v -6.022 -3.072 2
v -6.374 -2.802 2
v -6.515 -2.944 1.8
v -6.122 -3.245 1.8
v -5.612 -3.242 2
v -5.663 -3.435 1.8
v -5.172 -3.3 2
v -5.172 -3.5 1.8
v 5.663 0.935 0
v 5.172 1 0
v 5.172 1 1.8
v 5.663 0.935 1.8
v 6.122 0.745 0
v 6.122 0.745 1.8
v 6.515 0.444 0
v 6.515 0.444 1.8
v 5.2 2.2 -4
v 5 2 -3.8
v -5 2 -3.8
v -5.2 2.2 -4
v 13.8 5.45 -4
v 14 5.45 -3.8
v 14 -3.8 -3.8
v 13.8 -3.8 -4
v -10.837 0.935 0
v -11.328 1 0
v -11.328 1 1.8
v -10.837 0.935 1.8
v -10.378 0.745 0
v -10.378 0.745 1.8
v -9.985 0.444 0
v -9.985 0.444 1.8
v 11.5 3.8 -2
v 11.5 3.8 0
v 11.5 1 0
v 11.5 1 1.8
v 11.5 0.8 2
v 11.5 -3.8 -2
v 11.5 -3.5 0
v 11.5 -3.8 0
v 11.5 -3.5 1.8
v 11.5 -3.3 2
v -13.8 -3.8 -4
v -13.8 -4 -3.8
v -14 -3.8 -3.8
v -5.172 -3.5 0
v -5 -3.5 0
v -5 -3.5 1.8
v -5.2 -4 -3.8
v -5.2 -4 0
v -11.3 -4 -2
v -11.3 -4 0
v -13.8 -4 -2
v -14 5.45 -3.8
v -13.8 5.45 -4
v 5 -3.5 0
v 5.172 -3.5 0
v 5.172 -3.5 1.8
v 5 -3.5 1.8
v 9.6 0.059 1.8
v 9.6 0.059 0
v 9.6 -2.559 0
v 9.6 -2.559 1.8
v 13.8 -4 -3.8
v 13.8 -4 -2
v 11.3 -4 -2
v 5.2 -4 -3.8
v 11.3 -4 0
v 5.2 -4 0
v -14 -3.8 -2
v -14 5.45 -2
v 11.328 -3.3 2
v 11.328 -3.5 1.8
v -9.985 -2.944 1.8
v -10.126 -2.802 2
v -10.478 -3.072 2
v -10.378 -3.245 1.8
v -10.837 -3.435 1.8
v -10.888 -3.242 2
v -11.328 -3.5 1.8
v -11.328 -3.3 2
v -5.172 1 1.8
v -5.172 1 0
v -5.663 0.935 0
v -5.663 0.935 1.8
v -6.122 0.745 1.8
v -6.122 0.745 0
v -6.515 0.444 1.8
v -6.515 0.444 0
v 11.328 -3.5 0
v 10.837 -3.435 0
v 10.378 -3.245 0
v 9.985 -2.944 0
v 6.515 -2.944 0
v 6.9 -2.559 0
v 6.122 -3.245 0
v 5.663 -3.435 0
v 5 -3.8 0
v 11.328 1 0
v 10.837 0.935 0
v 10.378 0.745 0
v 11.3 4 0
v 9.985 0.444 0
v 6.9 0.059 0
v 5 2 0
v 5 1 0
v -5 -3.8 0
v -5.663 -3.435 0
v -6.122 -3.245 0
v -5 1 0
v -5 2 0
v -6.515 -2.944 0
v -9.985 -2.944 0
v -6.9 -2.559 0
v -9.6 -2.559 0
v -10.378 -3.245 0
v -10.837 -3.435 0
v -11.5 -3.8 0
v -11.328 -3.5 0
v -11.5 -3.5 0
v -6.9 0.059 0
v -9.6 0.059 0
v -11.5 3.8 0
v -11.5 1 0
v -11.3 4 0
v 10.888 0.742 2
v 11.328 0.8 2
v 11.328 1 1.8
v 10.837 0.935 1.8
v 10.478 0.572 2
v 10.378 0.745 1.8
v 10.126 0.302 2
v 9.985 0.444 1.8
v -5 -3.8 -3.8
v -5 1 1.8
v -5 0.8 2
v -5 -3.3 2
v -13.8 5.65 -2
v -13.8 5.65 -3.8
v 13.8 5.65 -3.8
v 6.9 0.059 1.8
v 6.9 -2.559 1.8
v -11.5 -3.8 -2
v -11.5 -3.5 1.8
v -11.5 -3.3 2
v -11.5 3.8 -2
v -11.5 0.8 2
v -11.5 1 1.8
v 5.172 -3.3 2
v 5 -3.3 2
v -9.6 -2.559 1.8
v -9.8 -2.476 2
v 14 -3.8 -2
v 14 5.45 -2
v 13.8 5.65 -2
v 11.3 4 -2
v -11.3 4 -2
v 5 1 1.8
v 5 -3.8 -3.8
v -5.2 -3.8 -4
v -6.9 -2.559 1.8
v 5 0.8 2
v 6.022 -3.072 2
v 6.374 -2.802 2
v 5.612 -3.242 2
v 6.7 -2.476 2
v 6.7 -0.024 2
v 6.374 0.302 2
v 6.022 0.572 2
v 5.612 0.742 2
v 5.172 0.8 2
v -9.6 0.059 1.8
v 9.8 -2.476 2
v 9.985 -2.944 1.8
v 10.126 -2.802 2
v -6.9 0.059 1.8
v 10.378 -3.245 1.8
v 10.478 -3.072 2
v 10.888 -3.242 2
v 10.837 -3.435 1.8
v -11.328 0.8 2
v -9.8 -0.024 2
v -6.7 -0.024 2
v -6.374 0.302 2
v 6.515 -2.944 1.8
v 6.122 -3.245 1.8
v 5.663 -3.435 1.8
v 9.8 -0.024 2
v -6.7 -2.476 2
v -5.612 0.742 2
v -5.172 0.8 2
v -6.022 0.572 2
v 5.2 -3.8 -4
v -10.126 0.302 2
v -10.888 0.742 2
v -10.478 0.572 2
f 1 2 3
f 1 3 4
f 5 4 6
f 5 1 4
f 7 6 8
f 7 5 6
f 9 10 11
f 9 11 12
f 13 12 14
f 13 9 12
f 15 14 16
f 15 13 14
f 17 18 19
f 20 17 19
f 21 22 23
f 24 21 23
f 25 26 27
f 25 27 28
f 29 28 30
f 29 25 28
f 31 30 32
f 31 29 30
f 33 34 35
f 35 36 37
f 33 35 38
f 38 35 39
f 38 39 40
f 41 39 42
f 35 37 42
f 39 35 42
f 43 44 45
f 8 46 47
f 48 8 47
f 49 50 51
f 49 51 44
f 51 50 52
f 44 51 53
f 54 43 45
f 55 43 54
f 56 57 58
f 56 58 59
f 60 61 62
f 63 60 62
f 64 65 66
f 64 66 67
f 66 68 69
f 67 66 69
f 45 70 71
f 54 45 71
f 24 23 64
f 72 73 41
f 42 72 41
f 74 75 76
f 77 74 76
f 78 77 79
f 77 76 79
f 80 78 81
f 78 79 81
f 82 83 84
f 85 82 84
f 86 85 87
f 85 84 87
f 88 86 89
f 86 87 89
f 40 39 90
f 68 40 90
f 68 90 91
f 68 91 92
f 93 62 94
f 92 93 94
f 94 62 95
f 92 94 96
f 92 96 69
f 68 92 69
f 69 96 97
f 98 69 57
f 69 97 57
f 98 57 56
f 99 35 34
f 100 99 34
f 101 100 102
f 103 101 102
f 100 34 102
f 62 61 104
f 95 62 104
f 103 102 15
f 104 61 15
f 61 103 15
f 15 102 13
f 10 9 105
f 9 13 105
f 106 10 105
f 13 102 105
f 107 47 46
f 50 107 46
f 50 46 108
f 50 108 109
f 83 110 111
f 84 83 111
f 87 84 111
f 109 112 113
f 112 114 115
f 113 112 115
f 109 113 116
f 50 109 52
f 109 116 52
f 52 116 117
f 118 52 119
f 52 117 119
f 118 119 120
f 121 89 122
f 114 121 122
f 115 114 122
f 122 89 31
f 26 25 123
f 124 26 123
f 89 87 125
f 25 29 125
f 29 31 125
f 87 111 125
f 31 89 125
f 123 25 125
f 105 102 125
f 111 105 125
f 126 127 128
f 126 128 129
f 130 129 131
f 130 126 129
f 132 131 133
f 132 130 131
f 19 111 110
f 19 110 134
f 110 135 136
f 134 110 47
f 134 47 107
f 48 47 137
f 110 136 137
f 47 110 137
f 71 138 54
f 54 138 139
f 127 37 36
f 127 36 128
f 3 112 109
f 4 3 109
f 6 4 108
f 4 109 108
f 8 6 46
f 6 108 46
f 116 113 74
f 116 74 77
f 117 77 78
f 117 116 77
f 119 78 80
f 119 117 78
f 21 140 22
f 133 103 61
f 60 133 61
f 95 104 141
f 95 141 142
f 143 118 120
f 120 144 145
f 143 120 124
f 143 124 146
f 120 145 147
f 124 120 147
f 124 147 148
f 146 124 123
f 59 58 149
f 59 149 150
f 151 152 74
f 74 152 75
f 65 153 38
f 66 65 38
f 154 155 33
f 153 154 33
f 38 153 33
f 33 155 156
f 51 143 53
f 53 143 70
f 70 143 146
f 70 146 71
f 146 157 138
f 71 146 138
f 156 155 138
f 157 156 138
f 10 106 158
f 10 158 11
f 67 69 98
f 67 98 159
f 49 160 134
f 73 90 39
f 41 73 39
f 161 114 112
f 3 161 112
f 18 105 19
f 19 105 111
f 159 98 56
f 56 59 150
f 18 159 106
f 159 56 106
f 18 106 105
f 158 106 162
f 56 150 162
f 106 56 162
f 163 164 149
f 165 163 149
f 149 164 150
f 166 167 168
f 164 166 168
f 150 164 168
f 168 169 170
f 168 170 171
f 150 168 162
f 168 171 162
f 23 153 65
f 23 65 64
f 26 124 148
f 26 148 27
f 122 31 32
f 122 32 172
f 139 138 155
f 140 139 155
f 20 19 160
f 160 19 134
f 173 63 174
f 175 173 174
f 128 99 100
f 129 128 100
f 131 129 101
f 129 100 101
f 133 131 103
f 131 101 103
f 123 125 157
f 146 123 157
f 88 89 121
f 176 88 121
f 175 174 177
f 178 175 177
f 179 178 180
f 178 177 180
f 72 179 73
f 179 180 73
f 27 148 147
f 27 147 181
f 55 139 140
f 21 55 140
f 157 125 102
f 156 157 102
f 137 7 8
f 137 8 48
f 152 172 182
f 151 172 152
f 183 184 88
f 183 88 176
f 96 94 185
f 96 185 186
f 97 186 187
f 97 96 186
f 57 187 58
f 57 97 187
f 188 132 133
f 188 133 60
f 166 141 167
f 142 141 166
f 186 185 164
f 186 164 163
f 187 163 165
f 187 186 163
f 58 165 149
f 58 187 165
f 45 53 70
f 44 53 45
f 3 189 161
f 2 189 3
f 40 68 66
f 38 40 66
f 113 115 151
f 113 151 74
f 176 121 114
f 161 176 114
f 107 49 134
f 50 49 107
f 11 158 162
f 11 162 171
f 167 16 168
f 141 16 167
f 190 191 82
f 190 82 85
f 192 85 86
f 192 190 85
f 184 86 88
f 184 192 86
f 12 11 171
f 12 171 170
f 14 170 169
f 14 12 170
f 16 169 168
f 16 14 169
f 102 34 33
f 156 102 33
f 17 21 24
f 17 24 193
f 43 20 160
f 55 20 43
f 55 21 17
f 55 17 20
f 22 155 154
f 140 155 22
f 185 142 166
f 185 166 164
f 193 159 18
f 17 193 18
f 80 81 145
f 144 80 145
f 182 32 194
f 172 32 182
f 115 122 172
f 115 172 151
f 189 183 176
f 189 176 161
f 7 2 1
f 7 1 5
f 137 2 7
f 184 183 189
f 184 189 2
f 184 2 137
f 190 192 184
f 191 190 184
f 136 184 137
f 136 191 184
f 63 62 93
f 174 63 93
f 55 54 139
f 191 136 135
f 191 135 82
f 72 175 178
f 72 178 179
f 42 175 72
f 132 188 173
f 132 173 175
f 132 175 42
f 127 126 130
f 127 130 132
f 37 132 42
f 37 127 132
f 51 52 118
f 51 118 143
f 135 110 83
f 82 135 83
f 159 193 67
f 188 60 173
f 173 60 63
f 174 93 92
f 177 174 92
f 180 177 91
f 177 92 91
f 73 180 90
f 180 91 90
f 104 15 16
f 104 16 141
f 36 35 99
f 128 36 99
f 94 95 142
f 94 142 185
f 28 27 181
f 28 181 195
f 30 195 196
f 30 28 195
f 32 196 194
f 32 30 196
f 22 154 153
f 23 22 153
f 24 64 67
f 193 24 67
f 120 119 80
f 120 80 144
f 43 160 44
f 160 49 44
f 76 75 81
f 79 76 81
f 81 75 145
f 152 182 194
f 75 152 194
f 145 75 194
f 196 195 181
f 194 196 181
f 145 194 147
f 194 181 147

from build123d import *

# Parameters (mm, degrees)
BOSS_EXTRUDE1_DEPTH  = 2
BOSS_EXTRUDE2_DEPTH  = 2
MIRROR2_COPY_1_DEPTH = 2
STOPPER_DEPTH        = 2
STOPPER_DEBURS_SIZE  = 0.2


with BuildPart() as part:
    # Sketch1 → Boss-Extrude1 (new body)
    with BuildSketch(Plane.XY):
        Polygon((-11.5, 4), (11.5, 4), (11.5, -4), (5, -4), (5, 2), (-5, 2), (-5, -4), (-11.5, -4), align=None)
    extrude(amount=-BOSS_EXTRUDE1_DEPTH)

    # Sketch2 → Boss-Extrude2 (add)
    with BuildSketch(Plane.XY):
        with BuildLine():
            Line((11.5, -3.5), (11.5, 1))
            Line((11.5, 1), (11.328427125, 1))
            ThreePointArc((11.328427125, 1), (10.601328603, 0.855371112), (9.98492424, 0.443502884))
            Line((9.98492424, 0.443502884), (9.6, 0.058578644))
            Line((9.6, 0.058578644), (9.6, -2.558578644))
            Line((9.6, -2.558578644), (9.98492424, -2.943502884))
            ThreePointArc((9.98492424, -2.943502884), (10.601328603, -3.355371112), (11.328427125, -3.5))
            Line((11.328427125, -3.5), (11.5, -3.5))
        make_face()
    boss_extrude2 = extrude(amount=BOSS_EXTRUDE2_DEPTH)

    # Mirror1: Boss-Extrude2 across plane
    add(boss_extrude2.mirror(Plane(origin=(8.25, 0, 0), x_dir=(0, 0, 1), z_dir=(1, 0, 0))))

    # Mirror2: Boss-Extrude2 across plane
    add(boss_extrude2.mirror(Plane(origin=(0, 0, 0), x_dir=(0, 0, 1), z_dir=(1, 0, 0))))

    # Mirror2 copy 1 sketch → Mirror2 copy 1 (add)
    with BuildSketch(Plane(origin=(-16.5, 0, 0), x_dir=(1, 0, 0), z_dir=(0, 0, 1))):
        with BuildLine():
            Line((11.5, -3.5), (11.5, 1))
            Line((11.5, 1), (11.328427125, 1))
            ThreePointArc((11.328427125, 1), (10.601328603, 0.855371112), (9.98492424, 0.443502884))
            Line((9.98492424, 0.443502884), (9.6, 0.058578644))
            Line((9.6, 0.058578644), (9.6, -2.558578644))
            Line((9.6, -2.558578644), (9.98492424, -2.943502884))
            ThreePointArc((9.98492424, -2.943502884), (10.601328603, -3.355371112), (11.328427125, -3.5))
            Line((11.328427125, -3.5), (11.5, -3.5))
        make_face()
    extrude(amount=MIRROR2_COPY_1_DEPTH)

    # Sketch4 → Stopper (add)
    with BuildSketch(Plane(origin=(0, 0, -2), x_dir=(-1, 0, 0), z_dir=(0, 0, -1))):
        Polygon((11.5, -4), (14, -4), (14, 5.65), (-14, 5.65), (-14, -4), (-11.5, -4), (-5, -4), (-5, 2), (5, 2), (5, -4), align=None)
    extrude(amount=STOPPER_DEPTH)

    # Stopper Deburs
    stopper_deburs_edges = [part.edges().sort_by_distance(p)[0] for p in [
        (-11.414213562, 1, 2),
        (-11.414213562, -3.5, 2),
        (-10.601328603, -3.355371112, 2),
        (-14, -4, -3),
        (-14, 5.65, -3),
        (14, 5.65, -3),
        (14, -4, -3),
        (-9.5, -4, -4),
        (-14, 0.825, -4),
        (0, 5.65, -4),
        (14, 0.825, -4),
        (9.5, -4, -4),
        (5, -1, -4),
        (0, 2, -4),
        (-5, -1, -4),
        (-11.5, 4, -1),
        (11.5, 4, -1),
        (11.5, -4, -1),
        (5, -4, -2),
        (-5, -4, -2),
        (-11.5, -4, -1),
        (9.79246212, -2.751040764, 2),
        (10.601328603, -3.355371112, 2),
        (11.414213562, -3.5, 2),
        (11.414213562, 1, 2),
        (10.601328603, 0.855371112, 2),
        (9.79246212, 0.251040764, 2),
        (9.6, -1.25, 2),
        (6.70753788, -2.751040764, 2),
        (6.9, -1.25, 2),
        (6.70753788, 0.251040764, 2),
        (5.898671397, 0.855371112, 2),
        (5.085786438, 1, 2),
        (5.085786438, -3.5, 2),
        (5.898671397, -3.355371112, 2),
        (-6.70753788, -2.751040764, 2),
        (-5.898671397, -3.355371112, 2),
        (-5.085786438, -3.5, 2),
        (-5.085786438, 1, 2),
        (-5.898671397, 0.855371112, 2),
        (-6.70753788, 0.251040764, 2),
        (-6.9, -1.25, 2),
        (-9.79246212, -2.751040764, 2),
        (-9.6, -1.25, 2),
        (-9.79246212, 0.251040764, 2),
        (-10.601328603, 0.855371112, 2),
    ]]
    chamfer(stopper_deburs_edges, length=STOPPER_DEBURS_SIZE)


solid = part.part
